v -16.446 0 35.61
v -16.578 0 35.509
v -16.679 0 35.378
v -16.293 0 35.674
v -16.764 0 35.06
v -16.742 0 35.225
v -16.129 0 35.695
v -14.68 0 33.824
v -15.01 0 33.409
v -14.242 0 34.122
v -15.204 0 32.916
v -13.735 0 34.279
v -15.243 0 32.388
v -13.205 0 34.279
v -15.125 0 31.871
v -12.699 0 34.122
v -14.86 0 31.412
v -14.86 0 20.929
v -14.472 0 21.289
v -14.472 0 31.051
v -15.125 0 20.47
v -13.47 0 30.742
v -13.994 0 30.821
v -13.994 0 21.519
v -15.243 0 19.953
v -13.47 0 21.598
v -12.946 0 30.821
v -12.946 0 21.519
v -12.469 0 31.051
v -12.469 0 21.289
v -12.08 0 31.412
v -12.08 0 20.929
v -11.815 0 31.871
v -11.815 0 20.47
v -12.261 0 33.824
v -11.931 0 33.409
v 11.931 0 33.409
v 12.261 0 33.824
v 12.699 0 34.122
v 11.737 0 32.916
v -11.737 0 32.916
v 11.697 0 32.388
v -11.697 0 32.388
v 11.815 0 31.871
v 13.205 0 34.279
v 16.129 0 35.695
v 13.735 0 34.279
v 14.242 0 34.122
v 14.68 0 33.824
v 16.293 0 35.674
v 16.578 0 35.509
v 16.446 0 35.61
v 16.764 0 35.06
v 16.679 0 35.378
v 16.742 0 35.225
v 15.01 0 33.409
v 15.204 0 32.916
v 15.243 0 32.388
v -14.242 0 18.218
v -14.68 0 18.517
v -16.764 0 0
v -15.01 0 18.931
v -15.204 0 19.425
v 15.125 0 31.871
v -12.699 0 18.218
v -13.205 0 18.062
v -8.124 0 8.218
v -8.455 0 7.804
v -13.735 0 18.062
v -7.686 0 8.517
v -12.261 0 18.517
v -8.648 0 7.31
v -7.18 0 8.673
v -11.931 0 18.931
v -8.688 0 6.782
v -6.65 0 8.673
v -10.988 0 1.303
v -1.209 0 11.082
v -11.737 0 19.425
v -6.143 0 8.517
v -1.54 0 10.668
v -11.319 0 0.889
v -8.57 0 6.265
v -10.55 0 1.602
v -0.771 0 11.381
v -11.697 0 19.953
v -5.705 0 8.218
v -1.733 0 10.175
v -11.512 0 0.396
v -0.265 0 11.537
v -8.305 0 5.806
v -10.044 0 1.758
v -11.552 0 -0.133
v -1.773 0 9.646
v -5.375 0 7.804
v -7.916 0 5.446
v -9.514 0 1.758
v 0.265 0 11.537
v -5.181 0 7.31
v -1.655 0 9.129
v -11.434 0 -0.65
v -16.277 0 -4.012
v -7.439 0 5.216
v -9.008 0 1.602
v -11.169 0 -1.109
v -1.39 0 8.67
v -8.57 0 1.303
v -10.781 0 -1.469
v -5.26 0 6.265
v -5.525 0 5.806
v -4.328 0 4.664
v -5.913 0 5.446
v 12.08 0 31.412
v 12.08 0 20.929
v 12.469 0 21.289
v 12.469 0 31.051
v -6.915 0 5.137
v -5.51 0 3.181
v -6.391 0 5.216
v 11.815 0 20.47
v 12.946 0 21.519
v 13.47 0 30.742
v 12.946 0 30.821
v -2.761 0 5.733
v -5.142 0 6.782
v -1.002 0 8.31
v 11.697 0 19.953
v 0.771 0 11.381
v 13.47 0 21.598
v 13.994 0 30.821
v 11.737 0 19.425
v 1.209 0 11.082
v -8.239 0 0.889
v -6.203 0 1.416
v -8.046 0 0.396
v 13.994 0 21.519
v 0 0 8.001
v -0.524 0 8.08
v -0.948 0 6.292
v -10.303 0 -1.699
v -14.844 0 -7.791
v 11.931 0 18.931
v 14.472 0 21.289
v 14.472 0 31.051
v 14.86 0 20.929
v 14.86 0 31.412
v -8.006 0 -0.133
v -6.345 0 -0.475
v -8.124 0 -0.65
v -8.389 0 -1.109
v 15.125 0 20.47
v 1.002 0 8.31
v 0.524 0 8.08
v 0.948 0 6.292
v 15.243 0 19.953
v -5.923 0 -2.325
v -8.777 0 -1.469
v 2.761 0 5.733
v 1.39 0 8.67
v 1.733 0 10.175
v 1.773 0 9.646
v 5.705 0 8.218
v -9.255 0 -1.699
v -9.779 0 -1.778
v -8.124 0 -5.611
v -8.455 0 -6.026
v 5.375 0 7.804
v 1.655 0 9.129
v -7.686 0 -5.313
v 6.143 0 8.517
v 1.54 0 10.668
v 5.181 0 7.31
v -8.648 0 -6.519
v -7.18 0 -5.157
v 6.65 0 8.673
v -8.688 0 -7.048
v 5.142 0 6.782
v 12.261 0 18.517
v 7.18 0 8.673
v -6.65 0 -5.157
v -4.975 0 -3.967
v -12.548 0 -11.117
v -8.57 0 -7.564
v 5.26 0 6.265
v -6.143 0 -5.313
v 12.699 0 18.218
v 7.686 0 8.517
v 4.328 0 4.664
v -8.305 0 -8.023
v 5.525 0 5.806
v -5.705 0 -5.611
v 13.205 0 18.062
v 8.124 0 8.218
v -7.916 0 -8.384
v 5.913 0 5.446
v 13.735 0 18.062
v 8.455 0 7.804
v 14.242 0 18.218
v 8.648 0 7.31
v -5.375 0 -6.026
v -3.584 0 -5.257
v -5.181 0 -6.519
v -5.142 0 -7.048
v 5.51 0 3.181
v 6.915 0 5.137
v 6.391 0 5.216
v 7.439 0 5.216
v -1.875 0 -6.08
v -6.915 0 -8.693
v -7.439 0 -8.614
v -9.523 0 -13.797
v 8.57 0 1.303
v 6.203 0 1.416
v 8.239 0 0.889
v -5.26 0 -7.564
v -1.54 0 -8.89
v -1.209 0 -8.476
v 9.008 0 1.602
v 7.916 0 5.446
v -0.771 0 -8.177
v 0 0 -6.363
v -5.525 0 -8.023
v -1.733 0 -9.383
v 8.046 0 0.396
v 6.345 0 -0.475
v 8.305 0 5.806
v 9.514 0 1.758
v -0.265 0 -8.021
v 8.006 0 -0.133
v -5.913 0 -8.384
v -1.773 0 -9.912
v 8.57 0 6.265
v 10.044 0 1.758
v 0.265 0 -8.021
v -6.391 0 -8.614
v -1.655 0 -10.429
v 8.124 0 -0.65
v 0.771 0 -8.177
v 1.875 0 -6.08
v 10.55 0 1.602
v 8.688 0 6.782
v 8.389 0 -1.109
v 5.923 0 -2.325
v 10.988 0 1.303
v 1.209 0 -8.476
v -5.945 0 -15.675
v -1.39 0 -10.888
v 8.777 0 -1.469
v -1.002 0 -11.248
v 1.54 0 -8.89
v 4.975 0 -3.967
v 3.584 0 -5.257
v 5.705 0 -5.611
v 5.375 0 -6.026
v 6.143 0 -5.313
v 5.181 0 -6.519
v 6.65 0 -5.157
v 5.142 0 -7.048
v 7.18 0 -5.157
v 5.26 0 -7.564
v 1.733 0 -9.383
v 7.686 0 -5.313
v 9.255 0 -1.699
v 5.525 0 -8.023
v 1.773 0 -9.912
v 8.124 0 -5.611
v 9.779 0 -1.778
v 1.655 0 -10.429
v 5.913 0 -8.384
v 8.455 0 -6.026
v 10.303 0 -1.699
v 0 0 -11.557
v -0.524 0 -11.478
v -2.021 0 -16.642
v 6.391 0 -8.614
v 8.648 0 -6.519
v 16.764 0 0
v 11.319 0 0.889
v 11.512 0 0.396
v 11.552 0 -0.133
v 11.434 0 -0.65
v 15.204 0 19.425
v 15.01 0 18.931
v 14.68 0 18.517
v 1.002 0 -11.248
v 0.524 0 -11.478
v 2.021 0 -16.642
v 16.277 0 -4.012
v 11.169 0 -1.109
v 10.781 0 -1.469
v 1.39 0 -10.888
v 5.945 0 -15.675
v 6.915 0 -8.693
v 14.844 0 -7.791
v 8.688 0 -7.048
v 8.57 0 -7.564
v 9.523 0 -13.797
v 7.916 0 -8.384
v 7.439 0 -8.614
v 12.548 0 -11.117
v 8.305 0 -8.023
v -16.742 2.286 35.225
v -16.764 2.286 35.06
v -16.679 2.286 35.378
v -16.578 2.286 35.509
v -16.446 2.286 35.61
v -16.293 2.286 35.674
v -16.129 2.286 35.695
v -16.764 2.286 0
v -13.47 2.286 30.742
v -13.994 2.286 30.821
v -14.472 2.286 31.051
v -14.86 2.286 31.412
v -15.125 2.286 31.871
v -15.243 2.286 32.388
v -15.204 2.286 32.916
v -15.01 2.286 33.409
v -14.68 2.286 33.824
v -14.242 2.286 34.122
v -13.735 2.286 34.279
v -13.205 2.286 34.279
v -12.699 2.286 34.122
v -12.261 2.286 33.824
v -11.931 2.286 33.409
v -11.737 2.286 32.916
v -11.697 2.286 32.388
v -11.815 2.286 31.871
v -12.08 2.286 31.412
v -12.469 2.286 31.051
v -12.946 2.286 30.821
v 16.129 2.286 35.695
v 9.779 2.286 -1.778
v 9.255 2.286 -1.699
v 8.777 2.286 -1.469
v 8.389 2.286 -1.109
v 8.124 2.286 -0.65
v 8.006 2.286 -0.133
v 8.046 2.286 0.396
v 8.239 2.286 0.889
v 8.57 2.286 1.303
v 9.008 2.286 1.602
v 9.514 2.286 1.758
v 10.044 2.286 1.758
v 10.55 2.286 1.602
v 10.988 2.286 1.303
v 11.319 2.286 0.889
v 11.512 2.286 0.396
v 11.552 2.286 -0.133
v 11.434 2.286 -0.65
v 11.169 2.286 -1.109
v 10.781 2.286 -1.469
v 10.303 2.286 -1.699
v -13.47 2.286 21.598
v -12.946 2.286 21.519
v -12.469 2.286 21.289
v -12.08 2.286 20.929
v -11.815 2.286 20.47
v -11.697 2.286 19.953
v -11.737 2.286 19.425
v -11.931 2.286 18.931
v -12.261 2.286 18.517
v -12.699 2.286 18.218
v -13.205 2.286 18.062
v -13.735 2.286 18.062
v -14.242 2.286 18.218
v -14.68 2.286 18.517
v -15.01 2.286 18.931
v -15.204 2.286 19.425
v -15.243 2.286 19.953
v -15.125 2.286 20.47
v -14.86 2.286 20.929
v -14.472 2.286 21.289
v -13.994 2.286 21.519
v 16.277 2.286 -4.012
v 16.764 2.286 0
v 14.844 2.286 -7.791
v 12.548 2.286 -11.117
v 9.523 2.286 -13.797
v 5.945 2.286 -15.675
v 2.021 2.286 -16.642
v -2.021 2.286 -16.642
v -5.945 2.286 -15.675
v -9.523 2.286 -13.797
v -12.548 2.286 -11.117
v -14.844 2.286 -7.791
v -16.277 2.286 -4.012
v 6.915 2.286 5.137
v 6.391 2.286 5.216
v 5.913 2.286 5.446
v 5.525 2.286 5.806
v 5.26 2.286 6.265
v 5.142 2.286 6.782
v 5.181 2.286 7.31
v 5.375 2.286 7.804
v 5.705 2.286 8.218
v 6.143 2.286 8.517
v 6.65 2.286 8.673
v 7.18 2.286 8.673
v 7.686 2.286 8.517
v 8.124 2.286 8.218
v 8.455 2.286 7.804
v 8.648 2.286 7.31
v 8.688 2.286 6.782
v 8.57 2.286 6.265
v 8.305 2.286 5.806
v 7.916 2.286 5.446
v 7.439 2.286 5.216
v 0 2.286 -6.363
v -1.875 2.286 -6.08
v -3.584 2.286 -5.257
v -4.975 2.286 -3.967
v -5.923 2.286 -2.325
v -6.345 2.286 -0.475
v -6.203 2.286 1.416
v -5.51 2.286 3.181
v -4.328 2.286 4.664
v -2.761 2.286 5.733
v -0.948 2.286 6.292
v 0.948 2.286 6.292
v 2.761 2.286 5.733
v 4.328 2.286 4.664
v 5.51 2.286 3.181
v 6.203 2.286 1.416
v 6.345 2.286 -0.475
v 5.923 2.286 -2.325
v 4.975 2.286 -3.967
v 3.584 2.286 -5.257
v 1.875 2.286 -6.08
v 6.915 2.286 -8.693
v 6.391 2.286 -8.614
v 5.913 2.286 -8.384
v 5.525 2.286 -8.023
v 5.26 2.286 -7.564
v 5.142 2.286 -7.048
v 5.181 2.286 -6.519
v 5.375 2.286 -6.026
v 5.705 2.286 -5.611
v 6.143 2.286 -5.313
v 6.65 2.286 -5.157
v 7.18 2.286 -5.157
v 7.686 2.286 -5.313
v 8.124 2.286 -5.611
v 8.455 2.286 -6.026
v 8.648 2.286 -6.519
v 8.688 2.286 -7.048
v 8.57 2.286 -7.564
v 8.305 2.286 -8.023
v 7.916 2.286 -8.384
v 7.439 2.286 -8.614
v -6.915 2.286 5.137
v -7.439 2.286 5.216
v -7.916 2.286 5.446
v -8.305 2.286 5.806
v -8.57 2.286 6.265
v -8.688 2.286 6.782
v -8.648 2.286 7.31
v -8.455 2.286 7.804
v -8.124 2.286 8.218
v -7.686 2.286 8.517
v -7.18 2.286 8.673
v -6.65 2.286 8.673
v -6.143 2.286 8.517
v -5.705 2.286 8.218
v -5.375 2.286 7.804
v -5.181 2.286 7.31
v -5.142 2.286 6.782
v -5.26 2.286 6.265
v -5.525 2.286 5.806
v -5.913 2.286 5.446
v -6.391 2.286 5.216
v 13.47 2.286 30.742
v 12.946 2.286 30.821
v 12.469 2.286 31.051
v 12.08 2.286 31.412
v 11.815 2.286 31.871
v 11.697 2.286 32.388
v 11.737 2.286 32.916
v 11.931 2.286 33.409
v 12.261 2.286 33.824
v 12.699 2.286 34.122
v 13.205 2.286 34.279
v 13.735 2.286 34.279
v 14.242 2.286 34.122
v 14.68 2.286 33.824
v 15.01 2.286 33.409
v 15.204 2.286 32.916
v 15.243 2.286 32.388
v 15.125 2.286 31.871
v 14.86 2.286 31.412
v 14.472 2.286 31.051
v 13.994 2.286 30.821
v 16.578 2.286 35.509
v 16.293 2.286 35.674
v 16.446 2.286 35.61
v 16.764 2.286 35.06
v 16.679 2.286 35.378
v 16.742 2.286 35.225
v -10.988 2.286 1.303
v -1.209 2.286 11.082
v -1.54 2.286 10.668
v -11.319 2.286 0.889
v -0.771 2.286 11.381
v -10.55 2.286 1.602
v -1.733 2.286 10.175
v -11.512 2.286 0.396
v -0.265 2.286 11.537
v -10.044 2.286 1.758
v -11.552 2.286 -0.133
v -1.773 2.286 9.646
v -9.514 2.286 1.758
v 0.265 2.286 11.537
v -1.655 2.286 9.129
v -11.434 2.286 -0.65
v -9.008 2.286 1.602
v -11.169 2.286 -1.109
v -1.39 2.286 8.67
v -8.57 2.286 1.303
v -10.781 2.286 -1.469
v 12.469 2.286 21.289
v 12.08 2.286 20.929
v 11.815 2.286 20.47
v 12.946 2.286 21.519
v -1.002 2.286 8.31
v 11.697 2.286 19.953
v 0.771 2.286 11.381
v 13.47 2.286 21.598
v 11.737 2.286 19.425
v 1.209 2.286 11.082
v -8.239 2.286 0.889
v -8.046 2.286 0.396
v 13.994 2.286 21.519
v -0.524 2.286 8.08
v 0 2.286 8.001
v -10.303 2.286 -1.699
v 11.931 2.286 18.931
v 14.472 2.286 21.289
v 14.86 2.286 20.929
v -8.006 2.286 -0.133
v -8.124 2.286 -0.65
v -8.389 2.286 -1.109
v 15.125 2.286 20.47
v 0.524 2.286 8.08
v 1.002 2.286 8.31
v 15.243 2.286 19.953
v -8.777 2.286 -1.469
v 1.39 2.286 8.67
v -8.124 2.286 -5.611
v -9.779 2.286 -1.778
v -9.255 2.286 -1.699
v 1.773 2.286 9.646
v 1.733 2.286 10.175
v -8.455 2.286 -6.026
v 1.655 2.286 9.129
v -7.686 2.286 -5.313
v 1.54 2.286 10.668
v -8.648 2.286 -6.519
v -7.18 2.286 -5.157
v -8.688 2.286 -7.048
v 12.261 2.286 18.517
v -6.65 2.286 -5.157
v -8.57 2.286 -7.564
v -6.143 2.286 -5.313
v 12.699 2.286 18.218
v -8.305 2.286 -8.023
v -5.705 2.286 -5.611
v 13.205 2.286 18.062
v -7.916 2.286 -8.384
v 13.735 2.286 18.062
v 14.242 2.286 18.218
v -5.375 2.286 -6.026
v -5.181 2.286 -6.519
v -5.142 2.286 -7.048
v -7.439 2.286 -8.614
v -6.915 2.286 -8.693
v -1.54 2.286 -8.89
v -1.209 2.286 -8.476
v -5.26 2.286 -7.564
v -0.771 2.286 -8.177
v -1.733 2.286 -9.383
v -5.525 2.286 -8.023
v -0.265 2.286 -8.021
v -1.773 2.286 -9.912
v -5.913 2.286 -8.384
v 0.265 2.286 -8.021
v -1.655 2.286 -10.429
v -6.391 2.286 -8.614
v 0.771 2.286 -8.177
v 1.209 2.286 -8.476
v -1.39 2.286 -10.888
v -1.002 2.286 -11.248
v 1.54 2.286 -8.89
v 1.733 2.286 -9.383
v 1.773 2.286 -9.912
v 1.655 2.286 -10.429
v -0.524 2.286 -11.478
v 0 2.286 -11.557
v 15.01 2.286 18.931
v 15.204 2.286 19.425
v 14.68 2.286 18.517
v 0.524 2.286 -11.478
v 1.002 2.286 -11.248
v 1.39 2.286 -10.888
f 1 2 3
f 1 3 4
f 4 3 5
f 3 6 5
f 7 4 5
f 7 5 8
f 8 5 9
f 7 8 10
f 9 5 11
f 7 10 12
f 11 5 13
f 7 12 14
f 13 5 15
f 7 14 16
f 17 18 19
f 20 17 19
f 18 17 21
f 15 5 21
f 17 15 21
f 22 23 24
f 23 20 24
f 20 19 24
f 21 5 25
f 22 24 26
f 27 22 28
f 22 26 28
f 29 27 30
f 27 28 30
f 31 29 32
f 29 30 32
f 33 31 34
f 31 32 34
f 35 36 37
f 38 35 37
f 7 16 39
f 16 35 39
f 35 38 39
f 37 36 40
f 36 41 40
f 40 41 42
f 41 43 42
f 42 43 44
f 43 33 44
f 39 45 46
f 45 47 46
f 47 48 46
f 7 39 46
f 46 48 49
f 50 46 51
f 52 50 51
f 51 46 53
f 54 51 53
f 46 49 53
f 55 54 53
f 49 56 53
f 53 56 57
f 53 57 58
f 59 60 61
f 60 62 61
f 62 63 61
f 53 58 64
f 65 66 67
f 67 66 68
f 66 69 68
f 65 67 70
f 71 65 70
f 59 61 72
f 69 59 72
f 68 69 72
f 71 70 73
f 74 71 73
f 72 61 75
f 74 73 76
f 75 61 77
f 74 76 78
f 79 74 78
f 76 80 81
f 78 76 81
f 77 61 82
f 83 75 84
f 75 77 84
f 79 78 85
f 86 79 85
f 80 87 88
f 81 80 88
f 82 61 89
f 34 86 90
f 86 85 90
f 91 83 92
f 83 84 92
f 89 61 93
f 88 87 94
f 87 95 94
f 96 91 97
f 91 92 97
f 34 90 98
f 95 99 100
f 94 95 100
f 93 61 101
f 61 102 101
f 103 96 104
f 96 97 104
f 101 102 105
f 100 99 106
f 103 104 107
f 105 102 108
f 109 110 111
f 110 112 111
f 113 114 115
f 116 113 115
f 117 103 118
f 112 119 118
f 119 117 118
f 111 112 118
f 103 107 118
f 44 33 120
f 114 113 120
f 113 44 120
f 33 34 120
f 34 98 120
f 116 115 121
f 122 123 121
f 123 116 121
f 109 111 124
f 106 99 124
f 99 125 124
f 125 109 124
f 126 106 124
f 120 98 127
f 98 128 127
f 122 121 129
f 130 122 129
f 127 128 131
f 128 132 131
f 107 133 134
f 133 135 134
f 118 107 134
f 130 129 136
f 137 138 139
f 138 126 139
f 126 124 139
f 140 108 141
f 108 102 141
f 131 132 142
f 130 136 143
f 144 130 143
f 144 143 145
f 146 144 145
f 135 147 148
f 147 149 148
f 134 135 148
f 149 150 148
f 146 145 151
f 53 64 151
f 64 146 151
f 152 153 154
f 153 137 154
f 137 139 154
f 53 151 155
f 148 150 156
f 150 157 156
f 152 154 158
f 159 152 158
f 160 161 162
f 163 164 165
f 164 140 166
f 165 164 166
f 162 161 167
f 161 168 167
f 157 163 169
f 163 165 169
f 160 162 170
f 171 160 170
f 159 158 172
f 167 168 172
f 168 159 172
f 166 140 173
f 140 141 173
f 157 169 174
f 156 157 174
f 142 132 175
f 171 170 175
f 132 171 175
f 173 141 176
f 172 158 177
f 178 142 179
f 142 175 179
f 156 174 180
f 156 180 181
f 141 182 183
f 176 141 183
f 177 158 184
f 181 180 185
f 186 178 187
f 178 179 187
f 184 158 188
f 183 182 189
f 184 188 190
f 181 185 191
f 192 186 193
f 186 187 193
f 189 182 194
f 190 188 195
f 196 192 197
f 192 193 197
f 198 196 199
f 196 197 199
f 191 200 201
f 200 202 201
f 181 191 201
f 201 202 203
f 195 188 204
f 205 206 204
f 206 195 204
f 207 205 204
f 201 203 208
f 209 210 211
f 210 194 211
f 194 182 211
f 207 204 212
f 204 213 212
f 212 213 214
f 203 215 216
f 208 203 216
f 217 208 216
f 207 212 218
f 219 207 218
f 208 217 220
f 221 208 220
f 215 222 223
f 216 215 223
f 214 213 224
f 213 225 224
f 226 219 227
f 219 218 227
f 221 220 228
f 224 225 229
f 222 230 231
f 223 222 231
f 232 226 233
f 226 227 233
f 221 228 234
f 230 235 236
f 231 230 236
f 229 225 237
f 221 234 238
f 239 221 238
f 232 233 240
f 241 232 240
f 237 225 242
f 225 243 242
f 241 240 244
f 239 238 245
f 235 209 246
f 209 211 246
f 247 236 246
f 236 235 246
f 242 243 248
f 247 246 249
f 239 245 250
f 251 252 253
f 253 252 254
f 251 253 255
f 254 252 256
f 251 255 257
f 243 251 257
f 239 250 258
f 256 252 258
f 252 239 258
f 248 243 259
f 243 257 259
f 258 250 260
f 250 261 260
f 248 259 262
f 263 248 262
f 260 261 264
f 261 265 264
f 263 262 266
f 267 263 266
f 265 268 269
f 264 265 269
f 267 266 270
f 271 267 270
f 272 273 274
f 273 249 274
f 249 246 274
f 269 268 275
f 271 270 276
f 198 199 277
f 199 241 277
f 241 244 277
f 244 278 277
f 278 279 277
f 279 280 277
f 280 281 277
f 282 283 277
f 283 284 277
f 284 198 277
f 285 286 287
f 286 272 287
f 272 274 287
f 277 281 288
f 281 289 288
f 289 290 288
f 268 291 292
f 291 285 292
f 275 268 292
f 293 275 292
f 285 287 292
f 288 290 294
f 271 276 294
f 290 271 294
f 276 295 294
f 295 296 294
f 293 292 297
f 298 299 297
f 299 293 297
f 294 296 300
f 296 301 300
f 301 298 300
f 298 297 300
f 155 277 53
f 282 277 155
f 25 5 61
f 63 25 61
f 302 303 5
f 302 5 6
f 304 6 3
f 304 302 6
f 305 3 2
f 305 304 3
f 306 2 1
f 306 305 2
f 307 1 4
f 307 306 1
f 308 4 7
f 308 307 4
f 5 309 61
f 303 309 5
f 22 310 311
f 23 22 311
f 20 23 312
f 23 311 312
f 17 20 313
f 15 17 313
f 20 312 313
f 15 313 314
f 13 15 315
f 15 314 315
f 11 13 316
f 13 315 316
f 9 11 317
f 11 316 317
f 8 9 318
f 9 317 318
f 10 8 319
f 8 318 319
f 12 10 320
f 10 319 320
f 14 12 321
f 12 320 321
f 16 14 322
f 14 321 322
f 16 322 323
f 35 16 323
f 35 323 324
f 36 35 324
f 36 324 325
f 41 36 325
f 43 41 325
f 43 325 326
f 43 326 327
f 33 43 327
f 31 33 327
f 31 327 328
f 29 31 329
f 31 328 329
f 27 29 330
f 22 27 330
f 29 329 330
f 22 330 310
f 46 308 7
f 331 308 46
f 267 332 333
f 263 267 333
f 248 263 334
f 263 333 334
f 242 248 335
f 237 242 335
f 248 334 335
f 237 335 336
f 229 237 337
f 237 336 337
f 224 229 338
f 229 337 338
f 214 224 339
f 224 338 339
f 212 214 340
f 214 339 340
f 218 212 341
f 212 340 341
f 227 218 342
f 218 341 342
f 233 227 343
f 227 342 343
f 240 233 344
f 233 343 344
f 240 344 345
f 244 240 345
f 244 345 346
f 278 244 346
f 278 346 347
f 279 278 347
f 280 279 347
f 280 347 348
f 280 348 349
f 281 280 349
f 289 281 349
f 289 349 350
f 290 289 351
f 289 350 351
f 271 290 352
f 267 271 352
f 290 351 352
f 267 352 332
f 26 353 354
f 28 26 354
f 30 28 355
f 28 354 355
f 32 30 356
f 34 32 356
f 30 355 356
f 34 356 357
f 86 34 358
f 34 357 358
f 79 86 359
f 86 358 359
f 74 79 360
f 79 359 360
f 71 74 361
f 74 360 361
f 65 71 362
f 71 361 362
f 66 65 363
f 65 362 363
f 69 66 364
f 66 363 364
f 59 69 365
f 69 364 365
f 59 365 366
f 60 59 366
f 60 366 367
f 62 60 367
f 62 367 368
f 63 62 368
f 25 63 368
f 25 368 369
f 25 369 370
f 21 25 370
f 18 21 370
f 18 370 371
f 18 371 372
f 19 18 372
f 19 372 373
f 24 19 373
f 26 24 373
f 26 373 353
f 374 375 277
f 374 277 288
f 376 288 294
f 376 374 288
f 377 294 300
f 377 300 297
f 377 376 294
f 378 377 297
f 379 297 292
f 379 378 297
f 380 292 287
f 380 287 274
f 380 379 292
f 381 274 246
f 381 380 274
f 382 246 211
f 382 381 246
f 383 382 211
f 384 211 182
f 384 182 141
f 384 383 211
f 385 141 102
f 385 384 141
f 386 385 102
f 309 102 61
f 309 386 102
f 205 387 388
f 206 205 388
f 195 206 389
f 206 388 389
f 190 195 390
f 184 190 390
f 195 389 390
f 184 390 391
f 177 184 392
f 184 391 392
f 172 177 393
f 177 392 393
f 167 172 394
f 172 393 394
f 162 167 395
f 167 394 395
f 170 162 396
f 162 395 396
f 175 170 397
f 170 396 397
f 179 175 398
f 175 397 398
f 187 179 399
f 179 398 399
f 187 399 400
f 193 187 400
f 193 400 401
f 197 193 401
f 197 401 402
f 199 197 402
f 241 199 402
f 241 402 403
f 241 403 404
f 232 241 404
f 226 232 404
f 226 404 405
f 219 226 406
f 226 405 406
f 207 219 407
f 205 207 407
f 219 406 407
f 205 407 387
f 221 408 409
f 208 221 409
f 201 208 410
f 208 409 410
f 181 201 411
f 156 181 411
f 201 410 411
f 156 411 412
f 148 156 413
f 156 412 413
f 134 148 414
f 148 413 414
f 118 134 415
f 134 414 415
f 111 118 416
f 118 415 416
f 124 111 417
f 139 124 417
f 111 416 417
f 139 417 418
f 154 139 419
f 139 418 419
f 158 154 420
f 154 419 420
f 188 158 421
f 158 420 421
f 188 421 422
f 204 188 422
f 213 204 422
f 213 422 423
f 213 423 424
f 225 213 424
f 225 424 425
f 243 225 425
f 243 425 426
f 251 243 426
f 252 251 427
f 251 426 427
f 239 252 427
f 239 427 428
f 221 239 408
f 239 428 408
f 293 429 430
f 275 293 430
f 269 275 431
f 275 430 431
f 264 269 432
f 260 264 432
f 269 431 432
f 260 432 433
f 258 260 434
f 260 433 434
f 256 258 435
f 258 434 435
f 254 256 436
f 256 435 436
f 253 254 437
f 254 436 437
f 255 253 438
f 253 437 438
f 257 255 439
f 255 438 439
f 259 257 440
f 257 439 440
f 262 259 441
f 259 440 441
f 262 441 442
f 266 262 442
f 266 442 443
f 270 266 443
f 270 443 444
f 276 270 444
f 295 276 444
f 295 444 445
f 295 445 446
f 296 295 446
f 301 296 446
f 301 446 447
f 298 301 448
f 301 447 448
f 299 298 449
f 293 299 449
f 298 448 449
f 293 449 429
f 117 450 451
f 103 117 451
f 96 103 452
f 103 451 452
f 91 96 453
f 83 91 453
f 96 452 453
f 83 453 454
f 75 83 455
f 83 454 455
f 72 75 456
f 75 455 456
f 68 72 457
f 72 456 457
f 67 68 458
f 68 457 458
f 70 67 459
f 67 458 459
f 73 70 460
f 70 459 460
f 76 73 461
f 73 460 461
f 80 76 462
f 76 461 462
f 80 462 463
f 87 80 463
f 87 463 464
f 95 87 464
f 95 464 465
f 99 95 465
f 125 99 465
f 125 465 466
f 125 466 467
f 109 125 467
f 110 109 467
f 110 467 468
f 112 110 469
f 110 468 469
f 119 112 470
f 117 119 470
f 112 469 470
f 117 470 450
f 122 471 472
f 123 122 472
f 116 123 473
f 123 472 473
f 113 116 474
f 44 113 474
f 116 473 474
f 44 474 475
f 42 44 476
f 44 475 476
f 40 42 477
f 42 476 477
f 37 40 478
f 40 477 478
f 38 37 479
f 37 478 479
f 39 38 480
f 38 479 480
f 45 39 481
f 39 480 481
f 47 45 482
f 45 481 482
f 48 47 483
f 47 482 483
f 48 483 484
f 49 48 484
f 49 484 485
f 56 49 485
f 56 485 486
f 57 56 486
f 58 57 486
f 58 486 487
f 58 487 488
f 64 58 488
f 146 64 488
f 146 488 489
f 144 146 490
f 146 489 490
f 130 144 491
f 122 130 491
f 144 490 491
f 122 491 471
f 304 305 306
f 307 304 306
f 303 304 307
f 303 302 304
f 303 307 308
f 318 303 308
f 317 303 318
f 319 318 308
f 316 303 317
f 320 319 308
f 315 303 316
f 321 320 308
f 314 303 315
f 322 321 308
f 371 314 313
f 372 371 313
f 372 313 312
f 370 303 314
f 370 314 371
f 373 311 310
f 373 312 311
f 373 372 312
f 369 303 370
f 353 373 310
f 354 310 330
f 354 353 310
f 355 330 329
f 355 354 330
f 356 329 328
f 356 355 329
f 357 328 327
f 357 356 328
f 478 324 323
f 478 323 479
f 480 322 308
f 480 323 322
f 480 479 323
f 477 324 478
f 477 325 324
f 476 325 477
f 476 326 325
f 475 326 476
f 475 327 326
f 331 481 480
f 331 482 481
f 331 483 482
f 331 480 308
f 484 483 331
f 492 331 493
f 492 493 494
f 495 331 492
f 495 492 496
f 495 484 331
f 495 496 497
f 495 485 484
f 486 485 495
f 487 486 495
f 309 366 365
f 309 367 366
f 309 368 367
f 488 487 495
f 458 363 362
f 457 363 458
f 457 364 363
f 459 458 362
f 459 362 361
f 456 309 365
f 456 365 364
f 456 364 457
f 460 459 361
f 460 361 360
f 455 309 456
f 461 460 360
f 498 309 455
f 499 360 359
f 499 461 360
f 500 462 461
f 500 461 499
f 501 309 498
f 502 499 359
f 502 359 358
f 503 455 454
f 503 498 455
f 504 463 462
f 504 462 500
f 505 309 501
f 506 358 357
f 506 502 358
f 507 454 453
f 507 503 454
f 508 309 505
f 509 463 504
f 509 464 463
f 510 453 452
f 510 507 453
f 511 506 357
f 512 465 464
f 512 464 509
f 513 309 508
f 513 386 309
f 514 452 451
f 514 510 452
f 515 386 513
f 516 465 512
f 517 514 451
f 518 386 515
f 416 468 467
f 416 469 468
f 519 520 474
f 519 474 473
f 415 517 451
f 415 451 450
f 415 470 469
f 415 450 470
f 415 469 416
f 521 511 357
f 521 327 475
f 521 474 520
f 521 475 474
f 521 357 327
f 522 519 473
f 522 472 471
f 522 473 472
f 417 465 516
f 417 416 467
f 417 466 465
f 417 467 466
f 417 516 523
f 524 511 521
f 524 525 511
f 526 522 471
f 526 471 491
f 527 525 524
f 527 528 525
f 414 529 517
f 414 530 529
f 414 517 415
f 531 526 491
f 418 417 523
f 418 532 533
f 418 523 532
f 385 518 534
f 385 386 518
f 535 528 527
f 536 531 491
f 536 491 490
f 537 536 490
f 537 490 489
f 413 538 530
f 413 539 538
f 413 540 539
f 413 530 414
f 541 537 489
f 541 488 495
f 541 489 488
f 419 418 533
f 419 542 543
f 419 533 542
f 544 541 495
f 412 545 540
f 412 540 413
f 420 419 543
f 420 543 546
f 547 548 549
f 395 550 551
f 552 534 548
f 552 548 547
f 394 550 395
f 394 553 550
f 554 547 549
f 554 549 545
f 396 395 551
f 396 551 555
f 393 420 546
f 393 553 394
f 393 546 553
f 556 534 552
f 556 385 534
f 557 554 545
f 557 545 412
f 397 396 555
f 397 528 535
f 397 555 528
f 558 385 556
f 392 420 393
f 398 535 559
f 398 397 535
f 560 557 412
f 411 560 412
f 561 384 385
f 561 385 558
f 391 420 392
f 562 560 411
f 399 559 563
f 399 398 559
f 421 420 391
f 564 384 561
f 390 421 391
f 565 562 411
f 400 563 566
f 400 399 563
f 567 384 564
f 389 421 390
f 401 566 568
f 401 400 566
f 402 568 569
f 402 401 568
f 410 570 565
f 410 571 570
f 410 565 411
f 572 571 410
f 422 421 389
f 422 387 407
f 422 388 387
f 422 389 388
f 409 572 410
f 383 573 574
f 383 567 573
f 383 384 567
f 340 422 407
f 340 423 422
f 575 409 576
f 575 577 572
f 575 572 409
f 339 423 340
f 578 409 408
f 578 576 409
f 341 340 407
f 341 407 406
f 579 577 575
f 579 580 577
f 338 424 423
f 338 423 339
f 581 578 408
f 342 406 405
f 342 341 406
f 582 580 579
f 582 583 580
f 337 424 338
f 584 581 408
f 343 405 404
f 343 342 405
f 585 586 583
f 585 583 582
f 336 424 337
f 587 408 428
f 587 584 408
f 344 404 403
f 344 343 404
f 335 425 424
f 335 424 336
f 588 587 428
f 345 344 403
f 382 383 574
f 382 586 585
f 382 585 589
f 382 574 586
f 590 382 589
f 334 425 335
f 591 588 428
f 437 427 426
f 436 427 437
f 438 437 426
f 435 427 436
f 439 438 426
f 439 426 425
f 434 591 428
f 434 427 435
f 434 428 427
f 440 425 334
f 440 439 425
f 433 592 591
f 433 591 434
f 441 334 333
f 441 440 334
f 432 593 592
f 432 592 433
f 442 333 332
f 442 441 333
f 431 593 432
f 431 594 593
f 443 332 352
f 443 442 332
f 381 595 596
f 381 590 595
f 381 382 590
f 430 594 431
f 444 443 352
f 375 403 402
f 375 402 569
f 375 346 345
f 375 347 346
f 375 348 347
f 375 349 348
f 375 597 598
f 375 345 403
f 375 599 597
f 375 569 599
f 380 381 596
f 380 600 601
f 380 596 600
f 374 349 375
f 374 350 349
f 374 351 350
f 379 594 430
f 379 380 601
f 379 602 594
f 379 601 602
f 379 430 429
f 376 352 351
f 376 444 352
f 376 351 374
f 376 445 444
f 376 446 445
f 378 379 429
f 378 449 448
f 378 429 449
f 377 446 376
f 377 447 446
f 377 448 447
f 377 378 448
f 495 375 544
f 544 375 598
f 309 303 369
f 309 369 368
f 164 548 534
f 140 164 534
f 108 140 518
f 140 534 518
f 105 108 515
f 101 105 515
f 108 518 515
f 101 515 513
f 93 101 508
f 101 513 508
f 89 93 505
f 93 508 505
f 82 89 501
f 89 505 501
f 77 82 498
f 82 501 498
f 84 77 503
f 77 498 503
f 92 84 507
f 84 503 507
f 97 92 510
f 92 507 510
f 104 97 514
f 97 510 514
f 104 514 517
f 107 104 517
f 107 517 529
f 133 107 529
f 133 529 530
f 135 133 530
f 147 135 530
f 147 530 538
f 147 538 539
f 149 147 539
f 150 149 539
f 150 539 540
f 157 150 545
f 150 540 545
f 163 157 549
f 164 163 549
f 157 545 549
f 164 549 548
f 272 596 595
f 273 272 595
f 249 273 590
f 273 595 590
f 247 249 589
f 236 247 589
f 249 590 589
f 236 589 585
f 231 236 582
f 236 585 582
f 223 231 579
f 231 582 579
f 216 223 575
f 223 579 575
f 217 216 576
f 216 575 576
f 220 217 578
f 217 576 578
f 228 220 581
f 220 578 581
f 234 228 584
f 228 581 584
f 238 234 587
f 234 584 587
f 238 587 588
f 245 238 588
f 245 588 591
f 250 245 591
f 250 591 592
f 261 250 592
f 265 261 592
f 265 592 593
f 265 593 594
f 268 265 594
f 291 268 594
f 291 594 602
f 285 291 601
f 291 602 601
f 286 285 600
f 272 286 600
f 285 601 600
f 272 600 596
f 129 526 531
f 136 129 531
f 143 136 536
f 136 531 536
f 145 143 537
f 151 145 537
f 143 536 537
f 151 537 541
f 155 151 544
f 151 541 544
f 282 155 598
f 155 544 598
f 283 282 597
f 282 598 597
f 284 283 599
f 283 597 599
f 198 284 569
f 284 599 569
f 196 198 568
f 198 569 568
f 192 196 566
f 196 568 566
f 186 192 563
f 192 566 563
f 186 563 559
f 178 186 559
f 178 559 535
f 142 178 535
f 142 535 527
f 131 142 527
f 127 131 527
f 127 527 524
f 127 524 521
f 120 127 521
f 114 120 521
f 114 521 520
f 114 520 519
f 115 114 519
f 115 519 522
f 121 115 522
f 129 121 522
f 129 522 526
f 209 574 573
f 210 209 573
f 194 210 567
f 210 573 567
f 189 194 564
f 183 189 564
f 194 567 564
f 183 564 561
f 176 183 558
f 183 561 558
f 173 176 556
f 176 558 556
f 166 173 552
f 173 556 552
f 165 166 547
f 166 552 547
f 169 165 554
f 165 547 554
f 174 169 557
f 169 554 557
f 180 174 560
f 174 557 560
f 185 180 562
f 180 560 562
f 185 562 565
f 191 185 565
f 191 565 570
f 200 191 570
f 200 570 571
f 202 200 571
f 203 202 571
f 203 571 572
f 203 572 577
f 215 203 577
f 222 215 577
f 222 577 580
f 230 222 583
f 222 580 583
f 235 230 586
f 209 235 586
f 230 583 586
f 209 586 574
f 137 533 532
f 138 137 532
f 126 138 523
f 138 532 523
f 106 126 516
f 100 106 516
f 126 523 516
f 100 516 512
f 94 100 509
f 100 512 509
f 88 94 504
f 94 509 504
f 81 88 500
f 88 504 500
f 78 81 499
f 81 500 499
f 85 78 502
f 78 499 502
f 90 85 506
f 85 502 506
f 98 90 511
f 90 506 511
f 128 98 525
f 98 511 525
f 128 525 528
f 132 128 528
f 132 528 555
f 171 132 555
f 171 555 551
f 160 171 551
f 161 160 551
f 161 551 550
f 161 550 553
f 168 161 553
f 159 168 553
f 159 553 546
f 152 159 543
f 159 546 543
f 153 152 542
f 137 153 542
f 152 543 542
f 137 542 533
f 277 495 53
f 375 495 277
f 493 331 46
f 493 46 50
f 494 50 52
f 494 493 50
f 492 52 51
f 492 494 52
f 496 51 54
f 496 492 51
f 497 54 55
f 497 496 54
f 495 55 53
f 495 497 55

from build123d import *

# Parameters (mm, degrees)
SKETCH1_R           = 6.3627
SKETCH1_R_2         = 1.778
BOSS_EXTRUDE1_DEPTH = 2.286
SKETCH2_R           = 1.778
CUT_EXTRUDE1_DEPTH  = 7.62


with BuildPart() as part:
    # Sketch1 → Boss-Extrude1 (new body)
    with BuildSketch(Plane(origin=(0, 2.286, 0), x_dir=(1, 0, 0), z_dir=(0, 1, 0))):
        with BuildLine():
            Line((16.764, -35.060382), (16.764, 0))
            ThreePointArc((16.764, 0), (0, 16.764), (-16.764, 0))
            Line((-16.764, 0), (-16.764, -35.060382))
            ThreePointArc((-16.764, -35.060382), (-16.578012806, -35.509394806), (-16.129, -35.695382))
            Line((-16.129, -35.695382), (16.129, -35.695382))
            ThreePointArc((16.129, -35.695382), (16.578012806, -35.509394806), (16.764, -35.060382))
        make_face()
        with Locations(Location((0, 0, 0), (0, 0, 90))):
            Circle(SKETCH1_R, mode=Mode.SUBTRACT)
        with Locations(Location((9.779, 0, 0), (0, 0, 90))):
            Circle(SKETCH1_R_2, mode=Mode.SUBTRACT)
        with Locations(Location((6.914797213, 6.914797213, 0), (0, 0, 90))):
            Circle(SKETCH1_R_2, mode=Mode.SUBTRACT)
        with Locations(Location((0, 9.779, 0), (0, 0, 90))):
            Circle(SKETCH1_R_2, mode=Mode.SUBTRACT)
        with Locations(Location((-6.914797213, 6.914797213, 0), (0, 0, 90))):
            Circle(SKETCH1_R_2, mode=Mode.SUBTRACT)
        with Locations(Location((-9.779, 0, 0), (0, 0, 90))):
            Circle(SKETCH1_R_2, mode=Mode.SUBTRACT)
        with Locations(Location((-6.914797213, -6.914797213, 0), (0, 0, 90))):
            Circle(SKETCH1_R_2, mode=Mode.SUBTRACT)
        with Locations(Location((0, -9.779, 0), (0, 0, 90))):
            Circle(SKETCH1_R_2, mode=Mode.SUBTRACT)
        with Locations(Location((6.914797213, -6.914797213, 0), (0, 0, 90))):
            Circle(SKETCH1_R_2, mode=Mode.SUBTRACT)
        with Locations(Location((13.470384182, -32.520382, 0), (0, 0, 90))):
            Circle(SKETCH1_R_2, mode=Mode.SUBTRACT)
        with Locations(Location((-13.470384182, -32.520382, 0), (0, 0, 90))):
            Circle(SKETCH1_R_2, mode=Mode.SUBTRACT)
    extrude(amount=-BOSS_EXTRUDE1_DEPTH)

    # Sketch2 → Cut-Extrude1 (cut)
    with BuildSketch(Plane(origin=(0, 2.286, 0), x_dir=(1, 0, 0), z_dir=(0, 1, 0))):
        with Locations(Location((13.470384182, -19.820382, 0), (0, 0, 270))):
            Circle(SKETCH2_R)
        with Locations(Location((-13.470384182, -19.820382, 0), (0, 0, 270))):
            Circle(SKETCH2_R)
    extrude(amount=-CUT_EXTRUDE1_DEPTH, mode=Mode.SUBTRACT)


solid = part.part
